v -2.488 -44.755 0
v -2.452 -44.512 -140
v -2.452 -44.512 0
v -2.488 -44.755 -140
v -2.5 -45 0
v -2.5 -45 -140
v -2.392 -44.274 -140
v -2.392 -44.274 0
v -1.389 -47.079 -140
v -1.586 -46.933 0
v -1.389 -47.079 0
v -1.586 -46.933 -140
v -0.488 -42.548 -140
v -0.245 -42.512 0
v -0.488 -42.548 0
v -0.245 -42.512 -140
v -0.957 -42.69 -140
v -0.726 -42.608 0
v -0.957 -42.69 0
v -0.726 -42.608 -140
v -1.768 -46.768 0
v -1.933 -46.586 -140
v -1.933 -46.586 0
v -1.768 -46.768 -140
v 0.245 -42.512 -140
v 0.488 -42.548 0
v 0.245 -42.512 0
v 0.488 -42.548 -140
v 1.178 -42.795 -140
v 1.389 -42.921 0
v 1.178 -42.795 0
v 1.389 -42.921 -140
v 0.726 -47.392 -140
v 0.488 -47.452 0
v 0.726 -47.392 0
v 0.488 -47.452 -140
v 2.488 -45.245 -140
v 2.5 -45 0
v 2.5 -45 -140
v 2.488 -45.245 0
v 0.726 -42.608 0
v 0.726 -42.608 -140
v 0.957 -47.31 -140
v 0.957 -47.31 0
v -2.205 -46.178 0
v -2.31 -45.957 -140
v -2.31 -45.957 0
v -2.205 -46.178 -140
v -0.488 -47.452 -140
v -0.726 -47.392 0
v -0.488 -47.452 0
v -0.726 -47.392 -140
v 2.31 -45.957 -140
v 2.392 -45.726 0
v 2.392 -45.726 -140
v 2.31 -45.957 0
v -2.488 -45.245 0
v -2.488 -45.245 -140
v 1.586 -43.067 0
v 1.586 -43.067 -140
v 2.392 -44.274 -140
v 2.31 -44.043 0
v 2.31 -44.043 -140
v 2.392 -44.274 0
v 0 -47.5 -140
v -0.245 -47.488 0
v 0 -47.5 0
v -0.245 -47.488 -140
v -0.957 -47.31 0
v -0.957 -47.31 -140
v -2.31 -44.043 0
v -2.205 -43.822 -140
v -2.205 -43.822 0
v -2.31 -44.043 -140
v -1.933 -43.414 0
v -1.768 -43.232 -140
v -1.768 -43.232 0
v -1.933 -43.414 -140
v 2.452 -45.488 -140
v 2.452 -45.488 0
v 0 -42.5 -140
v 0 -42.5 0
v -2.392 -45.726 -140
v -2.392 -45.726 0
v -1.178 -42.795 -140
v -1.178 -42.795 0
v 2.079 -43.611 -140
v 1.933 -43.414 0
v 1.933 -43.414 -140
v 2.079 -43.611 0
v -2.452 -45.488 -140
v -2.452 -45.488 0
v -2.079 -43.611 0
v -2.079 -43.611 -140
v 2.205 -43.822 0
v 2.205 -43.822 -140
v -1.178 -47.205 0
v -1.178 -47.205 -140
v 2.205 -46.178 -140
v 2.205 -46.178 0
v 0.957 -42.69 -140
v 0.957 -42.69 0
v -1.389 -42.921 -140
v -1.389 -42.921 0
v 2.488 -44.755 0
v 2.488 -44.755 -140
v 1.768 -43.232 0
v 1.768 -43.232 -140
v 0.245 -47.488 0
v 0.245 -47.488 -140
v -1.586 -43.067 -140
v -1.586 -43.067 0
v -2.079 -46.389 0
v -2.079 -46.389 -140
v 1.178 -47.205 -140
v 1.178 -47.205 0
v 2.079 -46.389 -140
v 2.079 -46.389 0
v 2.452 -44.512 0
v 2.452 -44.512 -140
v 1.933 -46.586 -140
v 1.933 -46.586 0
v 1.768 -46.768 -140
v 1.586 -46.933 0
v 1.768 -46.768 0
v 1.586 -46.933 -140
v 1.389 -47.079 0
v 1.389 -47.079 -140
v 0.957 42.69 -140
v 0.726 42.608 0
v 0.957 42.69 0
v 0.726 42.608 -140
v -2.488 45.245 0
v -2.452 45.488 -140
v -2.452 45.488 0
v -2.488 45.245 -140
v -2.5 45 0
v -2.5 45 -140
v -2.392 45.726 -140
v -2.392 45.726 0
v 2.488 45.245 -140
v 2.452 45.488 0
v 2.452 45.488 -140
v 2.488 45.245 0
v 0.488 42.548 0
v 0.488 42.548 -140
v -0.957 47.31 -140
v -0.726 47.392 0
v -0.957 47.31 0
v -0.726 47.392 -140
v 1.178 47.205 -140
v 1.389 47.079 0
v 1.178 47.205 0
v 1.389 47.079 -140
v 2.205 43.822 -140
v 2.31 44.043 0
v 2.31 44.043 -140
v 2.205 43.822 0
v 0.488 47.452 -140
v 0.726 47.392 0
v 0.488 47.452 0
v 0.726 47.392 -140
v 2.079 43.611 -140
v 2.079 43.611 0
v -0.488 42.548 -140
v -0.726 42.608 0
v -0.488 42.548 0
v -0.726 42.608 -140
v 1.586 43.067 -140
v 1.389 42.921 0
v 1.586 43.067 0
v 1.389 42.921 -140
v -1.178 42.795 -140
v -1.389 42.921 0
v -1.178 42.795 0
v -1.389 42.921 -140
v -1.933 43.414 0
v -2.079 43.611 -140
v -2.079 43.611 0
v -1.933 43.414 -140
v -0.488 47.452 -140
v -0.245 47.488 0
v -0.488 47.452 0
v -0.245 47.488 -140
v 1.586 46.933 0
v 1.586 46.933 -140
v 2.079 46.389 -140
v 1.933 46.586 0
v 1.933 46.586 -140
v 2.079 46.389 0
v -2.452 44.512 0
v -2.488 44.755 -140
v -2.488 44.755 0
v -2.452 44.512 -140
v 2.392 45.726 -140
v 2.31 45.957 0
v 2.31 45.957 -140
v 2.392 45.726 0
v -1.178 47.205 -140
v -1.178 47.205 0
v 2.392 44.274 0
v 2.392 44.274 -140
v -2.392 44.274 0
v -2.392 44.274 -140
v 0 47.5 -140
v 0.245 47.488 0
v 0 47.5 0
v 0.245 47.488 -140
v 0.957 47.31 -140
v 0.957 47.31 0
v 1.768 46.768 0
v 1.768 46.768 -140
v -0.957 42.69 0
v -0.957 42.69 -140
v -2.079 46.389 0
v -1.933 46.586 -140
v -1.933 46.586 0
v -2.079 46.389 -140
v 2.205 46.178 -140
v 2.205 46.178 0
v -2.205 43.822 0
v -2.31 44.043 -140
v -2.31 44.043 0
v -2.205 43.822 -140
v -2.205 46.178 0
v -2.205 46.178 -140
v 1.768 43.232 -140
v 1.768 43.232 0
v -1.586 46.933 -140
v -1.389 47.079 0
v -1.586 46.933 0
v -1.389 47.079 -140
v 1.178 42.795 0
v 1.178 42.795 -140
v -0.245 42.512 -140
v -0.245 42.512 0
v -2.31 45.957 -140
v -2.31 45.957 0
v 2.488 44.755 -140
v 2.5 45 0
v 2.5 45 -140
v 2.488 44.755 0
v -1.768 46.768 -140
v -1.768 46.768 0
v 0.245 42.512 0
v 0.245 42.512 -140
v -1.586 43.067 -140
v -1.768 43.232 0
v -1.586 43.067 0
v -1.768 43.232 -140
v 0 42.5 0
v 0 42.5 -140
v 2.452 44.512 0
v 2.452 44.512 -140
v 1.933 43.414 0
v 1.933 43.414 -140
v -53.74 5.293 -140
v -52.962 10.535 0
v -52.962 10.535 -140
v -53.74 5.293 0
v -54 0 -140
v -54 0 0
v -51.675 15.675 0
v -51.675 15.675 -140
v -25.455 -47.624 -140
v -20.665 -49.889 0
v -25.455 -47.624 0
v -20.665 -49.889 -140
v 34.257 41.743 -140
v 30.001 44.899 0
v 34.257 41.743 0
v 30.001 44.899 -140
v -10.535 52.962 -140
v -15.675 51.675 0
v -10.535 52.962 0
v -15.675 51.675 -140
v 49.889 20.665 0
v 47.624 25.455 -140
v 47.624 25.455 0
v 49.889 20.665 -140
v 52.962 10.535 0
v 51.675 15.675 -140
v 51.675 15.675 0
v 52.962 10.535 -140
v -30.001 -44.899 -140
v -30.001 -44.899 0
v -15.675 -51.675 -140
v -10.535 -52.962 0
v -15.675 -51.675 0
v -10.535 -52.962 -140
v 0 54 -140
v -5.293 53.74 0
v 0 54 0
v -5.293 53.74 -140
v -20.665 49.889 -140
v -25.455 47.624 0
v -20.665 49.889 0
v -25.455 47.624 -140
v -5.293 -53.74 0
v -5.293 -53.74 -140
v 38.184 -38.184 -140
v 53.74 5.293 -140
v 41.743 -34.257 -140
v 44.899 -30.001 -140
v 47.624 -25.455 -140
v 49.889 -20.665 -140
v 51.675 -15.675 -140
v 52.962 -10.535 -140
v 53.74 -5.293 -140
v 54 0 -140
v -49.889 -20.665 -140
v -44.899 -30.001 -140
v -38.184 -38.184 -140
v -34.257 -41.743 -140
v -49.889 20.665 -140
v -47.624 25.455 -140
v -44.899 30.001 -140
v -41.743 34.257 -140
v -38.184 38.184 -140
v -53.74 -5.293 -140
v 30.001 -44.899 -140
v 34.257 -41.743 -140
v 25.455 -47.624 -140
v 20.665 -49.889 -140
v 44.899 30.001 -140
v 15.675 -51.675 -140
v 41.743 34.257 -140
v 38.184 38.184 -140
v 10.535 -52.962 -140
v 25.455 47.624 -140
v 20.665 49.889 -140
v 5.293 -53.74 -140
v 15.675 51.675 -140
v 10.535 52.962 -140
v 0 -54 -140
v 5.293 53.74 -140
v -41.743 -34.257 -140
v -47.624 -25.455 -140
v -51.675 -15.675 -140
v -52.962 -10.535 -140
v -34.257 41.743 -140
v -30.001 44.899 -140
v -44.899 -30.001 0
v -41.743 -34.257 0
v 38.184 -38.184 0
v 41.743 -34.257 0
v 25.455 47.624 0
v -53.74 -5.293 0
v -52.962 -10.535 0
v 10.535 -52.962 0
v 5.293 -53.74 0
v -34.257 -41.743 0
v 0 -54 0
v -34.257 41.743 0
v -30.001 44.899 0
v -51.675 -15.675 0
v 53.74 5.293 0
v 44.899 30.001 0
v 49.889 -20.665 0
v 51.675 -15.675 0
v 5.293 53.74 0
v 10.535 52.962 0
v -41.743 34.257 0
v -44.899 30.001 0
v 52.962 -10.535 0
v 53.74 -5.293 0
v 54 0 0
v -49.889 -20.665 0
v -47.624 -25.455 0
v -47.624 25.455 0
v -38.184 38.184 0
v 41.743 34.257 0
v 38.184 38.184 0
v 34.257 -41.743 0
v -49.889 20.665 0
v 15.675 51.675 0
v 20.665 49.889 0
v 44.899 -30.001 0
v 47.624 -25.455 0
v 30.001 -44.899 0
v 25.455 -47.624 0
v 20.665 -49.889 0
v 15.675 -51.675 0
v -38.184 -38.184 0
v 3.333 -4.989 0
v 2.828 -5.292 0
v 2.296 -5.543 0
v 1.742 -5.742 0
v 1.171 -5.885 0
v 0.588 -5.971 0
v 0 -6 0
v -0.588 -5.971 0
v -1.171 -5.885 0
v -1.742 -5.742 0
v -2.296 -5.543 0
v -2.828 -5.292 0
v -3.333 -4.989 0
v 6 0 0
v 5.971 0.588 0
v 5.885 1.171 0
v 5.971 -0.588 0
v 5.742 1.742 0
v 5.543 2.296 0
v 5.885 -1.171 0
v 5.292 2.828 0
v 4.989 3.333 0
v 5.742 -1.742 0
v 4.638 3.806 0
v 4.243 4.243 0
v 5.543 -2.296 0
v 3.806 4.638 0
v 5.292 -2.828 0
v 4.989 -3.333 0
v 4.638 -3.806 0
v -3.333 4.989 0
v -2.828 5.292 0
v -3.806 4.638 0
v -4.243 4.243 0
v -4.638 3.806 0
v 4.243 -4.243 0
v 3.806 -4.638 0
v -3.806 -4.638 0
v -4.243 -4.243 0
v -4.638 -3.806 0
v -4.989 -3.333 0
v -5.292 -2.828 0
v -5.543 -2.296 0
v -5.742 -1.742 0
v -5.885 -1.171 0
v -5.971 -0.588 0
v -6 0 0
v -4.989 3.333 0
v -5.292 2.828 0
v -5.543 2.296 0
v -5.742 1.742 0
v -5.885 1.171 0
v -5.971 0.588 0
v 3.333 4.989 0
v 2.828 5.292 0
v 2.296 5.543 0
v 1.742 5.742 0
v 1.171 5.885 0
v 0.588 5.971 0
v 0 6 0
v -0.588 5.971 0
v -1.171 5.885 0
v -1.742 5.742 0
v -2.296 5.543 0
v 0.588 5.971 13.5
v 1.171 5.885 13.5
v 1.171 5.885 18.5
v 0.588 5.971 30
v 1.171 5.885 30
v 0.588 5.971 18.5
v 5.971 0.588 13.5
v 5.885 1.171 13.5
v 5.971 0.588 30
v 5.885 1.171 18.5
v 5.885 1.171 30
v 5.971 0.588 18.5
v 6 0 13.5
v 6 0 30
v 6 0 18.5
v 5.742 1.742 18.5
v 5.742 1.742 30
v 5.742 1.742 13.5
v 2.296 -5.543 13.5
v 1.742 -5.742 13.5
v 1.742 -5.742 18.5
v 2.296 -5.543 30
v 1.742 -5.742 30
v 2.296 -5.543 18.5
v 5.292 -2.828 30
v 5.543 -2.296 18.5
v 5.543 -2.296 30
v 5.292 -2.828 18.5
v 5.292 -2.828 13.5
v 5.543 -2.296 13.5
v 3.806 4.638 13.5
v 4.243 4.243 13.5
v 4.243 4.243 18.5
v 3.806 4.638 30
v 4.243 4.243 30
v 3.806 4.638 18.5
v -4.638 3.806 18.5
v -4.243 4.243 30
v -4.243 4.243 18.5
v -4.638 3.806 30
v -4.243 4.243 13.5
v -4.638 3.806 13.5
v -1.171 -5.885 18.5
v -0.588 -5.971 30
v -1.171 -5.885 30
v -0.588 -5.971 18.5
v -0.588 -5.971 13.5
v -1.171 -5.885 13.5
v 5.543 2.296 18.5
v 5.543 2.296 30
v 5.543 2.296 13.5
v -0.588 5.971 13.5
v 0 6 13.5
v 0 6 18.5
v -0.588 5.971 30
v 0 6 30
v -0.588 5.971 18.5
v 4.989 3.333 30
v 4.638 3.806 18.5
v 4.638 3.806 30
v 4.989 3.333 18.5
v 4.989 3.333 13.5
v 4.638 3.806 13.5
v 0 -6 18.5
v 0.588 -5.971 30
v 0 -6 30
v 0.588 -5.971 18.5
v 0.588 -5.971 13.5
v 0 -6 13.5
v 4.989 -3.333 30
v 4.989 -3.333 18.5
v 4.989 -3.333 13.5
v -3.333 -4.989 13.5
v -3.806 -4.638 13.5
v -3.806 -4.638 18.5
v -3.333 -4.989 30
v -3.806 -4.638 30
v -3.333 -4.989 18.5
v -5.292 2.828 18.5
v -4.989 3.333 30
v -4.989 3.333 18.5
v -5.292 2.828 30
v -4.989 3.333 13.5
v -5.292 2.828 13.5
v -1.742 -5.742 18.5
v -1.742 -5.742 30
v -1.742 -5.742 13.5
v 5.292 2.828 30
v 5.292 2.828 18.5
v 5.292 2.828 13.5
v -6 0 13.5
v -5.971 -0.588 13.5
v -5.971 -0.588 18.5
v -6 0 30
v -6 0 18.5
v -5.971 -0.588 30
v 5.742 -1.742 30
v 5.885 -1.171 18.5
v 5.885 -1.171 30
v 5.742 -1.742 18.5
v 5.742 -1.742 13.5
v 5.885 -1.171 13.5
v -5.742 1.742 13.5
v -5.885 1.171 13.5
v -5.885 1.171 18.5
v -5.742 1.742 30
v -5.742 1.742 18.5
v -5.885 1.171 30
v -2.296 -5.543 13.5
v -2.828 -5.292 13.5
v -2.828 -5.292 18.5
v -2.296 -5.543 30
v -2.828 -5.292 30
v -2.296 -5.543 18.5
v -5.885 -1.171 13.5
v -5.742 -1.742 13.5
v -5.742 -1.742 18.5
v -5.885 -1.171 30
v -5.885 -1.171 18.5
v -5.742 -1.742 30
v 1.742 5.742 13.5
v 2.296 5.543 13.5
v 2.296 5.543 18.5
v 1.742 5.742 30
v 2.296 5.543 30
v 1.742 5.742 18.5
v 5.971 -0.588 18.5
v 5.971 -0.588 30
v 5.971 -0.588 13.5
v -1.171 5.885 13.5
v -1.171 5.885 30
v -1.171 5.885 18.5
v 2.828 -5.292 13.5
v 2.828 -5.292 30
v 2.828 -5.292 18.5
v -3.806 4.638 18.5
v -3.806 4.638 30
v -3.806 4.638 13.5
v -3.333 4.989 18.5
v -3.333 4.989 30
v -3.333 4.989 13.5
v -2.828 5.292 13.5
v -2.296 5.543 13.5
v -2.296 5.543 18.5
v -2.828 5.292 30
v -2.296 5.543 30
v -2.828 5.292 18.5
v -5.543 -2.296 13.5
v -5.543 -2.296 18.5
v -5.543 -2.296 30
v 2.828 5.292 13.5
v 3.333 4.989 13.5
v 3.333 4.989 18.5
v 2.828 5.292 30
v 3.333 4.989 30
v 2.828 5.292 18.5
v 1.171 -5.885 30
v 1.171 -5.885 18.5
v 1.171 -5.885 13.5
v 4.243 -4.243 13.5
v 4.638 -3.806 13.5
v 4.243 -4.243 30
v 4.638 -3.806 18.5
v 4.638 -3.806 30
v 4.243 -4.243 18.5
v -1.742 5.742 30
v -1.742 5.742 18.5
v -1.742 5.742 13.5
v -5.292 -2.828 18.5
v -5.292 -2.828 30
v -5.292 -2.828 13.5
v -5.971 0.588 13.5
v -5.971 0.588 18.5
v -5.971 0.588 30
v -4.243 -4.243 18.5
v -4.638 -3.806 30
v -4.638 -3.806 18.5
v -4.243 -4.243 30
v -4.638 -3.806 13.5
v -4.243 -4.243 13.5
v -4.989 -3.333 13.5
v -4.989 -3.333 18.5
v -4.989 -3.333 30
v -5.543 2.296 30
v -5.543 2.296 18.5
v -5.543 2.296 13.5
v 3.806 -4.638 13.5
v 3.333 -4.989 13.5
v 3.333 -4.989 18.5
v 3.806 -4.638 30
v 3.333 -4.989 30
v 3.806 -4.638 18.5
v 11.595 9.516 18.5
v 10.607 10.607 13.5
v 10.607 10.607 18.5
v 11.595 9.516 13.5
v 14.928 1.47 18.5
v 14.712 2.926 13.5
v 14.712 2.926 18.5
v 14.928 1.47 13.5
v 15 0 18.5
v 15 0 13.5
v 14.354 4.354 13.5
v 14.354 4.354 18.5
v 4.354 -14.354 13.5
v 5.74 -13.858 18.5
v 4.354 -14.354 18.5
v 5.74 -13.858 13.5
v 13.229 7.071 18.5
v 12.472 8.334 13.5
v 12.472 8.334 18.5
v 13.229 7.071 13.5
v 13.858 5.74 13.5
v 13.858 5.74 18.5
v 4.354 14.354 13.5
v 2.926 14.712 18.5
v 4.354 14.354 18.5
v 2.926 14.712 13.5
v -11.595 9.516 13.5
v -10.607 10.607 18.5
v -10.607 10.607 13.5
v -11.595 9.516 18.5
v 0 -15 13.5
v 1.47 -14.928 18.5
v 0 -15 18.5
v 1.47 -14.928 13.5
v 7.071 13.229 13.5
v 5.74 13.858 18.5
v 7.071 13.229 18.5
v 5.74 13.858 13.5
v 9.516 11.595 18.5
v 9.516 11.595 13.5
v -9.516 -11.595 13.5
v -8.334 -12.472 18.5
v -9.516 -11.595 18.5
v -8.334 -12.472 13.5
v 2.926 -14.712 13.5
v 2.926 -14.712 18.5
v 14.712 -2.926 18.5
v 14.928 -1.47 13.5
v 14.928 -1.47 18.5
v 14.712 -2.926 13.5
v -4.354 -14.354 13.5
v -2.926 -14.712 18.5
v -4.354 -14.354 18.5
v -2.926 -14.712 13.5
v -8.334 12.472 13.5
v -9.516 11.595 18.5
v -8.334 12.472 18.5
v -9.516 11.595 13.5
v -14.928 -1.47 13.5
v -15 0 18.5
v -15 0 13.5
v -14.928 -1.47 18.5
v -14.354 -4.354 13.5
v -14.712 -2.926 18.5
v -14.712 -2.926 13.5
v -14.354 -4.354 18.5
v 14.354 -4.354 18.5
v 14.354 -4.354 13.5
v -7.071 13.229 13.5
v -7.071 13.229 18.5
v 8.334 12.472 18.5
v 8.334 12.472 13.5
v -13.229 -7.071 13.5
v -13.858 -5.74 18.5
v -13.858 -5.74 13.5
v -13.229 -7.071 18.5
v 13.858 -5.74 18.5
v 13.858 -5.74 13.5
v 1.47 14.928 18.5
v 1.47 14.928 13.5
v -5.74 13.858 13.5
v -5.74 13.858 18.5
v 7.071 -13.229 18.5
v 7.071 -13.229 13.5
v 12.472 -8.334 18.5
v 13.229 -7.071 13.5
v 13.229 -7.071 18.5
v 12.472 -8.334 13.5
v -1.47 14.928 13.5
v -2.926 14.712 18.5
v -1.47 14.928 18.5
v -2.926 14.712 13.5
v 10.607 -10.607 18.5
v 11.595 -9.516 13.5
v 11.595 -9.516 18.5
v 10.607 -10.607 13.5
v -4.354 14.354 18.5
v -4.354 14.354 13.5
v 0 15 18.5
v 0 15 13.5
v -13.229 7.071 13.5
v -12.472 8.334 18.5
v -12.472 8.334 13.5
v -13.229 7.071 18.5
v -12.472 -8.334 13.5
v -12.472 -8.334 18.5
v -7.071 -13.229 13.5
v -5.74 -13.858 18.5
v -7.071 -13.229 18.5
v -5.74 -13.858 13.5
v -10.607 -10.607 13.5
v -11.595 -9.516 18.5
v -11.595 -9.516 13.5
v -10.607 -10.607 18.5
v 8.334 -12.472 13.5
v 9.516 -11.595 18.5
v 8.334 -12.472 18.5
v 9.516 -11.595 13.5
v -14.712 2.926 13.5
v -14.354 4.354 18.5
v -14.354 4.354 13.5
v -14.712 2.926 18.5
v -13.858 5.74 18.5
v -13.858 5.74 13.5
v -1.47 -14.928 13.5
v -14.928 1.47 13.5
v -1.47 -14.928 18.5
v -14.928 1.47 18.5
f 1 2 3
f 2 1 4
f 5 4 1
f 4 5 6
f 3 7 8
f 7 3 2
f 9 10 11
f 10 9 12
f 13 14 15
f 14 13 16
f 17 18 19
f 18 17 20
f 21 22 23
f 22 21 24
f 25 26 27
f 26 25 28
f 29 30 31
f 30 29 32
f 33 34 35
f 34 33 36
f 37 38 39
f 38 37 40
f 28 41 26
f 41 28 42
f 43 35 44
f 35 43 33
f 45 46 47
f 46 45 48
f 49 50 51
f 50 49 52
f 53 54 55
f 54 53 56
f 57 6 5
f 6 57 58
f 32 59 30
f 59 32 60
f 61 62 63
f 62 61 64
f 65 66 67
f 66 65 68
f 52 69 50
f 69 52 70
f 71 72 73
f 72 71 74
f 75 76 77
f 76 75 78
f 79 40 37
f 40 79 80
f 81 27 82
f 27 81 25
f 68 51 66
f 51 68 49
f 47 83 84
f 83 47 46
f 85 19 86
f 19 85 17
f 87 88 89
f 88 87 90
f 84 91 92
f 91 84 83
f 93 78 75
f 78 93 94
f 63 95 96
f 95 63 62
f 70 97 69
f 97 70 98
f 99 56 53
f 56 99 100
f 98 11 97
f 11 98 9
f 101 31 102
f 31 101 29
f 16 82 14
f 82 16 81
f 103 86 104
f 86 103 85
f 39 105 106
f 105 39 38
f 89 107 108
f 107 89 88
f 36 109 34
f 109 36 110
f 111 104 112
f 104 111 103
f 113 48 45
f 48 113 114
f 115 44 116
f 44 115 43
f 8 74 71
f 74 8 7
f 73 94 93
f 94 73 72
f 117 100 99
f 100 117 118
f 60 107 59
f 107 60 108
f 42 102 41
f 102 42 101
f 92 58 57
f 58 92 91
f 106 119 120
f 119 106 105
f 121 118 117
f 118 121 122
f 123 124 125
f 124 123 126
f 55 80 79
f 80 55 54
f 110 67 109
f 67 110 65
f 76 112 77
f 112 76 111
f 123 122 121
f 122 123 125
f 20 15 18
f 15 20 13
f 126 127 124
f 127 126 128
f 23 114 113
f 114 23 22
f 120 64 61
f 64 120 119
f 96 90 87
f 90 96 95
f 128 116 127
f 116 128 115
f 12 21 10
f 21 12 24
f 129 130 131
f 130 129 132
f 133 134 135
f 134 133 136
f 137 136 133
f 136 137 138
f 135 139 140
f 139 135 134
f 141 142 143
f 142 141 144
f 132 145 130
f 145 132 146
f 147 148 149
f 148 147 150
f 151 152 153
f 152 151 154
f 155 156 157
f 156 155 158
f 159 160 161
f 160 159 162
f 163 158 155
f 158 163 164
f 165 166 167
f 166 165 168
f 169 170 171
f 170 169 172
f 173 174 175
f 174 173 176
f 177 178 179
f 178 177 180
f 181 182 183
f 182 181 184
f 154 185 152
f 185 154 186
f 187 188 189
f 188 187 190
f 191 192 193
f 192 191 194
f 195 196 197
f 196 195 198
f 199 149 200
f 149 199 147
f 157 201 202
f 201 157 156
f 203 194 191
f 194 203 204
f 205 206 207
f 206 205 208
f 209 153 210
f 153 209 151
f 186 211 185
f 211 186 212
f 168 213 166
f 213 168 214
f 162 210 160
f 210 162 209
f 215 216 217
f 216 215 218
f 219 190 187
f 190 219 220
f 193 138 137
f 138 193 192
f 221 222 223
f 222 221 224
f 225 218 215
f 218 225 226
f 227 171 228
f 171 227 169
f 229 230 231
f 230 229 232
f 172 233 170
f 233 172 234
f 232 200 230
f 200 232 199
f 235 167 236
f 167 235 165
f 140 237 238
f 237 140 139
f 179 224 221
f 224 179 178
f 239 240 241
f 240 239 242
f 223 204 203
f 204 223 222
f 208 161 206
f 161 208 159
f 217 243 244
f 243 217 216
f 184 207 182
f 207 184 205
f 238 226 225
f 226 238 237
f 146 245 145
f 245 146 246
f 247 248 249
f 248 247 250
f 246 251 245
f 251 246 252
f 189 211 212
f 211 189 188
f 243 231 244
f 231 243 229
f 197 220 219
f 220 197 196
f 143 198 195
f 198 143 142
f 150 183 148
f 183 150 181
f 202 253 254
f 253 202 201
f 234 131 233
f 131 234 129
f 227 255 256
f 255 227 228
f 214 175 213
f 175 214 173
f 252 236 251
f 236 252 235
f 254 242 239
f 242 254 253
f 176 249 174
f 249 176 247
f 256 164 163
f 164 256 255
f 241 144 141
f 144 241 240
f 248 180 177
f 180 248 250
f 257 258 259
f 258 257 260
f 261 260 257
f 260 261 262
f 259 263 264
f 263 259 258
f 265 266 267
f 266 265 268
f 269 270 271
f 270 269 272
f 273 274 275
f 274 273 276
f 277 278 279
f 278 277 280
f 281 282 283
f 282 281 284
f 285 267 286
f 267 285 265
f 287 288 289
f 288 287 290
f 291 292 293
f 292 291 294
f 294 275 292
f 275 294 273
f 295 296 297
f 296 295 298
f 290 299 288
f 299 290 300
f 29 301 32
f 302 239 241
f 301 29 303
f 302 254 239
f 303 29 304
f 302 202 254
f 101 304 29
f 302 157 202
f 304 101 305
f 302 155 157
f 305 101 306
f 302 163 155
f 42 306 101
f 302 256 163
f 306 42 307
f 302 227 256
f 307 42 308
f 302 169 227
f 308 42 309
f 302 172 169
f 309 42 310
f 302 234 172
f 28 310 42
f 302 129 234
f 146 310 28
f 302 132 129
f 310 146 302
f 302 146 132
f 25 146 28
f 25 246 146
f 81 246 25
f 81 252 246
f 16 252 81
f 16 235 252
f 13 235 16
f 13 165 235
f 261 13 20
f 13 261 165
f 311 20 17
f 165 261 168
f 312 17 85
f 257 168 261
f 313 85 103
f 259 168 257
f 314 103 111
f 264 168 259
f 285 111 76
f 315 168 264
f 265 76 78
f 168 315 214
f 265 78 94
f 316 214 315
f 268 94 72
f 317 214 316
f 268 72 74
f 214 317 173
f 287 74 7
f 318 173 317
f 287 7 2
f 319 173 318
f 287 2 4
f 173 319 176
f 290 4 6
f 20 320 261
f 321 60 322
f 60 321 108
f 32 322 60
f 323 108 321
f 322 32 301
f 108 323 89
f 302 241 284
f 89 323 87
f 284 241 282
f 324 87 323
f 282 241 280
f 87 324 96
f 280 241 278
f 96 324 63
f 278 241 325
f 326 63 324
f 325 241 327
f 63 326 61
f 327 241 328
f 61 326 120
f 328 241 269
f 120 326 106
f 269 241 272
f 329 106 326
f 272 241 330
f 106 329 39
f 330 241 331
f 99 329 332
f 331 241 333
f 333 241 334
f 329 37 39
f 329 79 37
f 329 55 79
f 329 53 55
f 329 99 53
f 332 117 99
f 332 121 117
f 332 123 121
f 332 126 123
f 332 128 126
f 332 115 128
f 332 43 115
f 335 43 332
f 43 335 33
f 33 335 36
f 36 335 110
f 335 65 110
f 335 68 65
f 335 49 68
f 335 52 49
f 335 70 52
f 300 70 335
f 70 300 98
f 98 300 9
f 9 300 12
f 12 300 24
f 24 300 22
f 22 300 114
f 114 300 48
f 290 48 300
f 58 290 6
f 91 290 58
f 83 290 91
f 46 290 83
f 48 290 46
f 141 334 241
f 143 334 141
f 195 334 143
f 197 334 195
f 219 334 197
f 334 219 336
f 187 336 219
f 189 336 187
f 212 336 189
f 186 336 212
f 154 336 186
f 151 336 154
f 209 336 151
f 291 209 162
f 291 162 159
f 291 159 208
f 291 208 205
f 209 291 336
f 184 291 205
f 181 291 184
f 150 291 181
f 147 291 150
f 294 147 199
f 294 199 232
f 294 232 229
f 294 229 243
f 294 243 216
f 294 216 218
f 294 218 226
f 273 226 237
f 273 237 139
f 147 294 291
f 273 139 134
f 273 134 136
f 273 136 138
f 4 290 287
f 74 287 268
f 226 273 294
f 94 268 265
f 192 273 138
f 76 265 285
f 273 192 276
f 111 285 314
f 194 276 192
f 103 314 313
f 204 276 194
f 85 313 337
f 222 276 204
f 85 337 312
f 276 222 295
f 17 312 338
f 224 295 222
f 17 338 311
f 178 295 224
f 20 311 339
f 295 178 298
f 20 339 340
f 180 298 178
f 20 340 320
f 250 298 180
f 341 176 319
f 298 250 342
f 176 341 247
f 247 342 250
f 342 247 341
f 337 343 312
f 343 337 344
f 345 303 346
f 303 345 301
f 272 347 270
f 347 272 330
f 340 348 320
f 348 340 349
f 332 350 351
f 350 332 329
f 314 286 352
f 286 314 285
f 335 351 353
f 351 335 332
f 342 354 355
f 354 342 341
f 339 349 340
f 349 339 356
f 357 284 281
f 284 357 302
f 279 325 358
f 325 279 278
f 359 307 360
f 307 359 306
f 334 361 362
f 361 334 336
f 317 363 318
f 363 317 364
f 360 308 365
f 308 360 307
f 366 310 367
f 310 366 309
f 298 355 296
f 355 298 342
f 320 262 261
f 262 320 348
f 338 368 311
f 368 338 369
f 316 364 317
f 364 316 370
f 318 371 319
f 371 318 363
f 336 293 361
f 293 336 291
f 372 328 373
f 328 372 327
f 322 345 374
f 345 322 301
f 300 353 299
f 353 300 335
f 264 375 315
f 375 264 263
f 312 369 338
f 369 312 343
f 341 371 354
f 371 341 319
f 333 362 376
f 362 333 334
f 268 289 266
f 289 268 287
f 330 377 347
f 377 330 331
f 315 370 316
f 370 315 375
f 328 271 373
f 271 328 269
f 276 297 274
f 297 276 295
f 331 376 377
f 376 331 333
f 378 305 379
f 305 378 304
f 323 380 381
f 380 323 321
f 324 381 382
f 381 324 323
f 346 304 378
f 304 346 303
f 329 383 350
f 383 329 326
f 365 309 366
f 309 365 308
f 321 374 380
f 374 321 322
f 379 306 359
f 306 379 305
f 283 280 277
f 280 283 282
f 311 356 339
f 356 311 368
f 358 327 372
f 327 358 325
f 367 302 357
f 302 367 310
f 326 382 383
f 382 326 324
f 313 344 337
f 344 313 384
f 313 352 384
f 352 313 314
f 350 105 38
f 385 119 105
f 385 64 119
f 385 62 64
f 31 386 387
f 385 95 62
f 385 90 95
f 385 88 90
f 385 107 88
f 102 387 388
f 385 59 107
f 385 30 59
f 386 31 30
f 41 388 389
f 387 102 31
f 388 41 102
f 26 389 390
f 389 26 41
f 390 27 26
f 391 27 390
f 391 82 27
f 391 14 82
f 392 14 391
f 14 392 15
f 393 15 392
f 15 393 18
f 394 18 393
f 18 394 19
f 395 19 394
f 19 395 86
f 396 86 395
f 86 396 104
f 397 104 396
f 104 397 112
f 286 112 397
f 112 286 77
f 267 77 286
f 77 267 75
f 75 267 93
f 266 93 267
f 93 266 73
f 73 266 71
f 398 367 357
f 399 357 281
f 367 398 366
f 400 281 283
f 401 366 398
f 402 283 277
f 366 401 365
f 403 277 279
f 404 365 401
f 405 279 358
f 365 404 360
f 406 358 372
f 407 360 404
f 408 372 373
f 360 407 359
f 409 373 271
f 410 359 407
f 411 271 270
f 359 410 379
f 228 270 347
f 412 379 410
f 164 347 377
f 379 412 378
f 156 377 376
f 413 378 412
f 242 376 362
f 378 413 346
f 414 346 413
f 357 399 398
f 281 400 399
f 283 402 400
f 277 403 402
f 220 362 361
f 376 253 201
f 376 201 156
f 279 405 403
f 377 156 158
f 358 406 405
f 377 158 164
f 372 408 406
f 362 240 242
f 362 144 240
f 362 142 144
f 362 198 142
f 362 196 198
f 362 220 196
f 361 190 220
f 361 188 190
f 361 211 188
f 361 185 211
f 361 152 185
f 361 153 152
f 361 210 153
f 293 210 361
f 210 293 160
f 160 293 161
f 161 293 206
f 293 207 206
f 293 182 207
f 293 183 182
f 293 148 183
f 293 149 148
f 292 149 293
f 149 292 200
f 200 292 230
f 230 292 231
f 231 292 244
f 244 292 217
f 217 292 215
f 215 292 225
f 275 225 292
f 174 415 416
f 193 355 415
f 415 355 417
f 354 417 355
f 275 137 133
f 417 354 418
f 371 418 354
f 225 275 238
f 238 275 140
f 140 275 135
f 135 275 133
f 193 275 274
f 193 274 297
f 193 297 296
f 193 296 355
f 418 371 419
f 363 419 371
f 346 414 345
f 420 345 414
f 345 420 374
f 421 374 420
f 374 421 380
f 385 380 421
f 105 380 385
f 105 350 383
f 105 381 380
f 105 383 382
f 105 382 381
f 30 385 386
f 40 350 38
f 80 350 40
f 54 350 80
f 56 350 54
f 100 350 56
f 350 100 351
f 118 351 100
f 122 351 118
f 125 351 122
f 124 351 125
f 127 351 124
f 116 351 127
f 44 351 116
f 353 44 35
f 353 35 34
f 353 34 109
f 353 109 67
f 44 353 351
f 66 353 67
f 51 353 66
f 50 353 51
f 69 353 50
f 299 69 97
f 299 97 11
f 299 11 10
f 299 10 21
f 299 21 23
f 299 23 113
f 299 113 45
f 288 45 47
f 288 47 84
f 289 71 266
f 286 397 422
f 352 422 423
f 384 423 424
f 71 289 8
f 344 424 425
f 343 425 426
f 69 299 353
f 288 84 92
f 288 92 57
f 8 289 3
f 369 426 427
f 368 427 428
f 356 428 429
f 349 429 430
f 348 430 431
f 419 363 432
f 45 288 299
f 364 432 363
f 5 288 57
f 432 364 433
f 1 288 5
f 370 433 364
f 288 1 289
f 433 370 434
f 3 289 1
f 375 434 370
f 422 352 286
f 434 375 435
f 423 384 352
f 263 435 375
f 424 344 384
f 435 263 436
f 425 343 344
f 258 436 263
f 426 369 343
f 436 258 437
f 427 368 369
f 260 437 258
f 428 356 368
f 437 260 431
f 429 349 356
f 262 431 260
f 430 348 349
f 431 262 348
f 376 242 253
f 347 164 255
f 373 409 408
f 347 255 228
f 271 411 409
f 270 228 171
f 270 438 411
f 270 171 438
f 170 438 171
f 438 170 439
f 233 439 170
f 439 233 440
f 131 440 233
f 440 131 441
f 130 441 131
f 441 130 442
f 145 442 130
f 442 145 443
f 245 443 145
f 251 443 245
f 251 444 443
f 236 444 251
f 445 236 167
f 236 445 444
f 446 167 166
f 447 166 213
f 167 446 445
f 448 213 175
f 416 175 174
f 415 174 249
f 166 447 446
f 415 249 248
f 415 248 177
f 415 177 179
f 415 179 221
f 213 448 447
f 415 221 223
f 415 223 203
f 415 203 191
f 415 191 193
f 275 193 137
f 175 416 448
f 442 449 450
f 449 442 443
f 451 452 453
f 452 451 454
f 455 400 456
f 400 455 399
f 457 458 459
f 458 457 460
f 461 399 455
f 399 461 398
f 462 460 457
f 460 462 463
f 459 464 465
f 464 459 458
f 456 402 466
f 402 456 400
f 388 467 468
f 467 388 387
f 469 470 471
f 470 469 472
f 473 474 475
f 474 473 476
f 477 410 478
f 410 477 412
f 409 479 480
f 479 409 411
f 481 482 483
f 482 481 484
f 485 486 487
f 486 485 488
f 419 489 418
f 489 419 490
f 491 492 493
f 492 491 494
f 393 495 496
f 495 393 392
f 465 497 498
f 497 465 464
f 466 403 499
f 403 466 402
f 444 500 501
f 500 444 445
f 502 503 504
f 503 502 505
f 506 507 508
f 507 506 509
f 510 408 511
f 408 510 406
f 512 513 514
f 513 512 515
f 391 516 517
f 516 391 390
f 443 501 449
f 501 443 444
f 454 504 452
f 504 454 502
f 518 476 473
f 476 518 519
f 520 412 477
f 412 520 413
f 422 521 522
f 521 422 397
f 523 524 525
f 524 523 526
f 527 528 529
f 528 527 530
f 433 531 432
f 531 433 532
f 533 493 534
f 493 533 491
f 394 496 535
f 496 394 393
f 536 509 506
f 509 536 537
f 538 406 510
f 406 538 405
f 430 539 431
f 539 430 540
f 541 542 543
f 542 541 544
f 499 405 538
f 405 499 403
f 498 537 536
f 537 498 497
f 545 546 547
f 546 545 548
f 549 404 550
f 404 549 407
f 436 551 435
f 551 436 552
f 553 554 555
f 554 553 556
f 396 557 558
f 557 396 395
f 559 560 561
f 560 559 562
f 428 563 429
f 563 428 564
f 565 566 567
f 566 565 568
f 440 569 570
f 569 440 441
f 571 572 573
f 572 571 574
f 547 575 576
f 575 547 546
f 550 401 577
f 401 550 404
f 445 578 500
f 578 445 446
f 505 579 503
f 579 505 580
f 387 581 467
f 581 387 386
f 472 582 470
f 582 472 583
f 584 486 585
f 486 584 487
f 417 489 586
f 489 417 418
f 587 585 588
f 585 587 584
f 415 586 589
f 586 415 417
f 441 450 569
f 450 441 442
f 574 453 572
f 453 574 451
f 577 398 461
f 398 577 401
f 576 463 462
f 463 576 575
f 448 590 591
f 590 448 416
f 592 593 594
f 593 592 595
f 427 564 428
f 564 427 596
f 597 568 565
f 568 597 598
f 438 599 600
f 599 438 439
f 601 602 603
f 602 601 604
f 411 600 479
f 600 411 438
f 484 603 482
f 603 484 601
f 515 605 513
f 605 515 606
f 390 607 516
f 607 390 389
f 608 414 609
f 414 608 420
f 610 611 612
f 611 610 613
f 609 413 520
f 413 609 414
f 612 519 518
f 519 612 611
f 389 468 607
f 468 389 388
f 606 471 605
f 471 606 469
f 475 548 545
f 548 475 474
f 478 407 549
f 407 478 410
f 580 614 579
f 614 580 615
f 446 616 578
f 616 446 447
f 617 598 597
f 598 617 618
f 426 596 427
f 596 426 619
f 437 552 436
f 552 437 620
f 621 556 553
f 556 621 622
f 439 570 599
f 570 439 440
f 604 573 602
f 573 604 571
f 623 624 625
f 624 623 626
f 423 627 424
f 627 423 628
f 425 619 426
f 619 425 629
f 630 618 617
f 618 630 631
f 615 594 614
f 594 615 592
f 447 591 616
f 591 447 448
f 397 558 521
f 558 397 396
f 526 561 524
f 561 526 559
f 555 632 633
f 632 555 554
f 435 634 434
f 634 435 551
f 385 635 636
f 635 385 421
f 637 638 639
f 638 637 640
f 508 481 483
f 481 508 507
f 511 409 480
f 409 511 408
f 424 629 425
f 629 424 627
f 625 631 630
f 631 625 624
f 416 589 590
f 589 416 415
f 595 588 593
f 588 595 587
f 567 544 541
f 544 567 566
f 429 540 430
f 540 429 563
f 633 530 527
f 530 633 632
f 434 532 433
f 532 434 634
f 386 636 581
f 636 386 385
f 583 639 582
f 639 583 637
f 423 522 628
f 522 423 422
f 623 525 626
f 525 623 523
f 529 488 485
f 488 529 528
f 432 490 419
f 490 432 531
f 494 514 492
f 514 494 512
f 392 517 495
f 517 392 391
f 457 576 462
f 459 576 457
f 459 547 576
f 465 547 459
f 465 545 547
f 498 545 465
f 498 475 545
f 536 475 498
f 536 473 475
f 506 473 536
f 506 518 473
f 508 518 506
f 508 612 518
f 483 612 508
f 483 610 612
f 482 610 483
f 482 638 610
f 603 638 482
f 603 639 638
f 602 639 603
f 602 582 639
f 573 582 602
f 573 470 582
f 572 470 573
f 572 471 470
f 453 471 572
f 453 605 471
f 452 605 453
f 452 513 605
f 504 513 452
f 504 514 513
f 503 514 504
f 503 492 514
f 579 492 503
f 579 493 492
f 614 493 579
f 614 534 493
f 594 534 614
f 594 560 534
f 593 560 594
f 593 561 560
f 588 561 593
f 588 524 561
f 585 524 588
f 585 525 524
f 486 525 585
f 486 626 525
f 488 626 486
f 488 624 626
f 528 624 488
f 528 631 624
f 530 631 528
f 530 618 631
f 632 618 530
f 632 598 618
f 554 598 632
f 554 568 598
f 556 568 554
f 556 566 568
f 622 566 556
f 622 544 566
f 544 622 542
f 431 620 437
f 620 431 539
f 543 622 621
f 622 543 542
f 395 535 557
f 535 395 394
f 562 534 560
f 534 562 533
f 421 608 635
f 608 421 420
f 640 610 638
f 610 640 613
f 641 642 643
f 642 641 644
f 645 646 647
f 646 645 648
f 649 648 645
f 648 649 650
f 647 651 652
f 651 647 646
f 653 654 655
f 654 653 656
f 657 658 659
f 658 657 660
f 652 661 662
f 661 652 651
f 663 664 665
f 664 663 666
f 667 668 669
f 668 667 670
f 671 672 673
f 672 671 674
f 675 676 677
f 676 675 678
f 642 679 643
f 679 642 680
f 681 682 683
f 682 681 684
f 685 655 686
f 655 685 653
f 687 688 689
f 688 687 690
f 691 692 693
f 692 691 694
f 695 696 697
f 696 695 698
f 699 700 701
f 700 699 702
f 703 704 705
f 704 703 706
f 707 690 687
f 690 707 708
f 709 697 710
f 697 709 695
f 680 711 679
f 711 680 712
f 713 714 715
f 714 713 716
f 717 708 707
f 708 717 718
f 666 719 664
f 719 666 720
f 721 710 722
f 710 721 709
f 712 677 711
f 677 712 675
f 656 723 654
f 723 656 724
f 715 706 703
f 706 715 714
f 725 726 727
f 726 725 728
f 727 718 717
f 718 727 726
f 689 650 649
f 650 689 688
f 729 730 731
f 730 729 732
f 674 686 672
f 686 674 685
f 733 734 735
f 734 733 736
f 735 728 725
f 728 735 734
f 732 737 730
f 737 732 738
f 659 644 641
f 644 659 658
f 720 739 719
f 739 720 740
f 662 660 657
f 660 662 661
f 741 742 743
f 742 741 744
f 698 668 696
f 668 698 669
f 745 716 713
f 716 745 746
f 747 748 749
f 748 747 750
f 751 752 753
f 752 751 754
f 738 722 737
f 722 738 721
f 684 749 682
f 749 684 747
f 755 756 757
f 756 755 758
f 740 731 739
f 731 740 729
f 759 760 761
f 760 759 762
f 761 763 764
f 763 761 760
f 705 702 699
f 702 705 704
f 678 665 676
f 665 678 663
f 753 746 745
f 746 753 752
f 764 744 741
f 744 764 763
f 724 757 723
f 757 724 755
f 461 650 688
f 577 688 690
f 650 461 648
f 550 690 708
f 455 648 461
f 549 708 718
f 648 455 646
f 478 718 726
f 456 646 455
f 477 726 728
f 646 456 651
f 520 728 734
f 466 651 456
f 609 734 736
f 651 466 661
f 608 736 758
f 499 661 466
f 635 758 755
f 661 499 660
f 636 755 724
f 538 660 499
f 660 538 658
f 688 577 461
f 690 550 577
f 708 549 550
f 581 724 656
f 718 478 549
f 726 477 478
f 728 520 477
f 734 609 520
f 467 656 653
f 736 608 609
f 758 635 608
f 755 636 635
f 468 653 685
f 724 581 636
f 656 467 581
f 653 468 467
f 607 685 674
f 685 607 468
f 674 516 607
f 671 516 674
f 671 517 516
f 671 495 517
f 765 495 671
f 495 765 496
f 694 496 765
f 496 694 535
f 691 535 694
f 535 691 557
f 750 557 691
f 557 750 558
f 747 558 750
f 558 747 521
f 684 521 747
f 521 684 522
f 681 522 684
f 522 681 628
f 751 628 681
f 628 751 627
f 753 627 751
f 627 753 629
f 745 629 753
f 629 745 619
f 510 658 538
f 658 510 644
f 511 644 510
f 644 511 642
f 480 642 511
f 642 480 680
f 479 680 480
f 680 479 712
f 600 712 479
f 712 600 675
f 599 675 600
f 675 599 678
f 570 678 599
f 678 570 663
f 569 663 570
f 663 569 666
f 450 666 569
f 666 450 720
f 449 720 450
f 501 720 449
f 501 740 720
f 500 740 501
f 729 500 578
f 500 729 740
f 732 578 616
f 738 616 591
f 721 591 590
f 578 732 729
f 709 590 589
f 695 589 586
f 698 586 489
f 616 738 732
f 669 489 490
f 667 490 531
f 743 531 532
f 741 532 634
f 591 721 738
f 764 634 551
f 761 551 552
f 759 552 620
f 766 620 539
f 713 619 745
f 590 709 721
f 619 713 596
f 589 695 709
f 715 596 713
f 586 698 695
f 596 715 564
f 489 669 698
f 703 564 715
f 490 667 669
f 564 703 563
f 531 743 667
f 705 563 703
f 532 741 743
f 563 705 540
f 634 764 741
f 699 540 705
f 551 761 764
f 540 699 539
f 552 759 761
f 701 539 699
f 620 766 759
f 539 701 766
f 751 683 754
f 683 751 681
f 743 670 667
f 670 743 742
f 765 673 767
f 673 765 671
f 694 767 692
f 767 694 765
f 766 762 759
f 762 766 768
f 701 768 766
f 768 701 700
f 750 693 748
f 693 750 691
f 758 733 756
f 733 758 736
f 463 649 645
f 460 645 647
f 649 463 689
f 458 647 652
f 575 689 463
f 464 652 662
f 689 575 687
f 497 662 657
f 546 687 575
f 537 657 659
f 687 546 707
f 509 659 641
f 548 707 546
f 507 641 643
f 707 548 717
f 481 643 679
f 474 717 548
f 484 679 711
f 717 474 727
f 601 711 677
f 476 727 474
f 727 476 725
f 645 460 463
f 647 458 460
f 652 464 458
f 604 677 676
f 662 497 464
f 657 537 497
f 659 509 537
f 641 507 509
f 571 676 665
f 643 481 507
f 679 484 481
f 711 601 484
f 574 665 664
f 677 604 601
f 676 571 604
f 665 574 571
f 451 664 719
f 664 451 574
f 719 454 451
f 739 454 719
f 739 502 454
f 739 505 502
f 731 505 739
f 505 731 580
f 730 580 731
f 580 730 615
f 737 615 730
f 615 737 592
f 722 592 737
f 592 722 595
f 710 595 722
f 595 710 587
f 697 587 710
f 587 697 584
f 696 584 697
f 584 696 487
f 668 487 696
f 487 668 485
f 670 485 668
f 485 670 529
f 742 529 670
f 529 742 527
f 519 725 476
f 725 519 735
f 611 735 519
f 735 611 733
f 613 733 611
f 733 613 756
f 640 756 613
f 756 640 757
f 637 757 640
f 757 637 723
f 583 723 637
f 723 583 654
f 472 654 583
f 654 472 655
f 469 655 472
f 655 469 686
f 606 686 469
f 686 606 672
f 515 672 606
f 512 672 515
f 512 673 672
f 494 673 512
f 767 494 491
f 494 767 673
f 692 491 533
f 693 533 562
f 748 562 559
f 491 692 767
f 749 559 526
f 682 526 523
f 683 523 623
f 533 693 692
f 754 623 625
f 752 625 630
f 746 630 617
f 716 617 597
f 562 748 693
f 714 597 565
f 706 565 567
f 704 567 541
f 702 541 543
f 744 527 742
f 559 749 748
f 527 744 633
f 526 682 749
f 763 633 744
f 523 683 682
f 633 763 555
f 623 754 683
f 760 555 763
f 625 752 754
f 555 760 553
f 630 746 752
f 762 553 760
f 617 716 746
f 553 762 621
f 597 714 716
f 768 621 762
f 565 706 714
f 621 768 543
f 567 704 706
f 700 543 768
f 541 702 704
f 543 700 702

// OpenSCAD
body_diameter = 108;

mounting_hole_centres = 90;
mounting_hole_diameter = 5;

module Motor()
{
  $fn=64;

  body_length = 140;

  shaft_diameter = 12;
  shaft_length = 30;

  sprocket_diameter = 30;
  sprocket_pos = 16;

  rotate([0, 180, 0])
  {
    /* Body */
    color("orange")
    {
      difference()
      {
        cylinder(d=body_diameter, h=body_length);

        /* Mounting holes */
        for(y = [-mounting_hole_centres/2, mounting_hole_centres/2])
        {
          translate([0, y, -1])
          {
            cylinder(d=mounting_hole_diameter, h=body_length+2);
          }
        }
      }
    }
  }

  /* Shaft */
  color("black")
  {
    cylinder(d=shaft_diameter, h=shaft_length);
  }

  translate([0, 0, sprocket_pos])
  {
    color("cyan")
    {
      cylinder(d=sprocket_diameter, h=5, center=true);
    }
  }
}

module Motor2D()
{
  shaft_surround_diam = 22;

  vent_holes_centres = 65;
  vent_holes_diameter = 10;

  difference()
  {
    circle(d=body_diameter);

    circle(d=shaft_surround_diam);

    for(y = [-mounting_hole_centres/2, mounting_hole_centres/2])
    {
      translate([0, y, -1])
      {
        circle(d=mounting_hole_diameter);
      }
    }

    for (a = [0 : 360/8 : 359])
    {
      rotate([0, 0, a])
      {
        translate([vent_holes_centres / 2, 0])
        {
          circle(d=vent_holes_diameter);
        }
      }
    }
  }
}

Motor();

translate([0, 0, 50])
{
  Motor2D();
}
